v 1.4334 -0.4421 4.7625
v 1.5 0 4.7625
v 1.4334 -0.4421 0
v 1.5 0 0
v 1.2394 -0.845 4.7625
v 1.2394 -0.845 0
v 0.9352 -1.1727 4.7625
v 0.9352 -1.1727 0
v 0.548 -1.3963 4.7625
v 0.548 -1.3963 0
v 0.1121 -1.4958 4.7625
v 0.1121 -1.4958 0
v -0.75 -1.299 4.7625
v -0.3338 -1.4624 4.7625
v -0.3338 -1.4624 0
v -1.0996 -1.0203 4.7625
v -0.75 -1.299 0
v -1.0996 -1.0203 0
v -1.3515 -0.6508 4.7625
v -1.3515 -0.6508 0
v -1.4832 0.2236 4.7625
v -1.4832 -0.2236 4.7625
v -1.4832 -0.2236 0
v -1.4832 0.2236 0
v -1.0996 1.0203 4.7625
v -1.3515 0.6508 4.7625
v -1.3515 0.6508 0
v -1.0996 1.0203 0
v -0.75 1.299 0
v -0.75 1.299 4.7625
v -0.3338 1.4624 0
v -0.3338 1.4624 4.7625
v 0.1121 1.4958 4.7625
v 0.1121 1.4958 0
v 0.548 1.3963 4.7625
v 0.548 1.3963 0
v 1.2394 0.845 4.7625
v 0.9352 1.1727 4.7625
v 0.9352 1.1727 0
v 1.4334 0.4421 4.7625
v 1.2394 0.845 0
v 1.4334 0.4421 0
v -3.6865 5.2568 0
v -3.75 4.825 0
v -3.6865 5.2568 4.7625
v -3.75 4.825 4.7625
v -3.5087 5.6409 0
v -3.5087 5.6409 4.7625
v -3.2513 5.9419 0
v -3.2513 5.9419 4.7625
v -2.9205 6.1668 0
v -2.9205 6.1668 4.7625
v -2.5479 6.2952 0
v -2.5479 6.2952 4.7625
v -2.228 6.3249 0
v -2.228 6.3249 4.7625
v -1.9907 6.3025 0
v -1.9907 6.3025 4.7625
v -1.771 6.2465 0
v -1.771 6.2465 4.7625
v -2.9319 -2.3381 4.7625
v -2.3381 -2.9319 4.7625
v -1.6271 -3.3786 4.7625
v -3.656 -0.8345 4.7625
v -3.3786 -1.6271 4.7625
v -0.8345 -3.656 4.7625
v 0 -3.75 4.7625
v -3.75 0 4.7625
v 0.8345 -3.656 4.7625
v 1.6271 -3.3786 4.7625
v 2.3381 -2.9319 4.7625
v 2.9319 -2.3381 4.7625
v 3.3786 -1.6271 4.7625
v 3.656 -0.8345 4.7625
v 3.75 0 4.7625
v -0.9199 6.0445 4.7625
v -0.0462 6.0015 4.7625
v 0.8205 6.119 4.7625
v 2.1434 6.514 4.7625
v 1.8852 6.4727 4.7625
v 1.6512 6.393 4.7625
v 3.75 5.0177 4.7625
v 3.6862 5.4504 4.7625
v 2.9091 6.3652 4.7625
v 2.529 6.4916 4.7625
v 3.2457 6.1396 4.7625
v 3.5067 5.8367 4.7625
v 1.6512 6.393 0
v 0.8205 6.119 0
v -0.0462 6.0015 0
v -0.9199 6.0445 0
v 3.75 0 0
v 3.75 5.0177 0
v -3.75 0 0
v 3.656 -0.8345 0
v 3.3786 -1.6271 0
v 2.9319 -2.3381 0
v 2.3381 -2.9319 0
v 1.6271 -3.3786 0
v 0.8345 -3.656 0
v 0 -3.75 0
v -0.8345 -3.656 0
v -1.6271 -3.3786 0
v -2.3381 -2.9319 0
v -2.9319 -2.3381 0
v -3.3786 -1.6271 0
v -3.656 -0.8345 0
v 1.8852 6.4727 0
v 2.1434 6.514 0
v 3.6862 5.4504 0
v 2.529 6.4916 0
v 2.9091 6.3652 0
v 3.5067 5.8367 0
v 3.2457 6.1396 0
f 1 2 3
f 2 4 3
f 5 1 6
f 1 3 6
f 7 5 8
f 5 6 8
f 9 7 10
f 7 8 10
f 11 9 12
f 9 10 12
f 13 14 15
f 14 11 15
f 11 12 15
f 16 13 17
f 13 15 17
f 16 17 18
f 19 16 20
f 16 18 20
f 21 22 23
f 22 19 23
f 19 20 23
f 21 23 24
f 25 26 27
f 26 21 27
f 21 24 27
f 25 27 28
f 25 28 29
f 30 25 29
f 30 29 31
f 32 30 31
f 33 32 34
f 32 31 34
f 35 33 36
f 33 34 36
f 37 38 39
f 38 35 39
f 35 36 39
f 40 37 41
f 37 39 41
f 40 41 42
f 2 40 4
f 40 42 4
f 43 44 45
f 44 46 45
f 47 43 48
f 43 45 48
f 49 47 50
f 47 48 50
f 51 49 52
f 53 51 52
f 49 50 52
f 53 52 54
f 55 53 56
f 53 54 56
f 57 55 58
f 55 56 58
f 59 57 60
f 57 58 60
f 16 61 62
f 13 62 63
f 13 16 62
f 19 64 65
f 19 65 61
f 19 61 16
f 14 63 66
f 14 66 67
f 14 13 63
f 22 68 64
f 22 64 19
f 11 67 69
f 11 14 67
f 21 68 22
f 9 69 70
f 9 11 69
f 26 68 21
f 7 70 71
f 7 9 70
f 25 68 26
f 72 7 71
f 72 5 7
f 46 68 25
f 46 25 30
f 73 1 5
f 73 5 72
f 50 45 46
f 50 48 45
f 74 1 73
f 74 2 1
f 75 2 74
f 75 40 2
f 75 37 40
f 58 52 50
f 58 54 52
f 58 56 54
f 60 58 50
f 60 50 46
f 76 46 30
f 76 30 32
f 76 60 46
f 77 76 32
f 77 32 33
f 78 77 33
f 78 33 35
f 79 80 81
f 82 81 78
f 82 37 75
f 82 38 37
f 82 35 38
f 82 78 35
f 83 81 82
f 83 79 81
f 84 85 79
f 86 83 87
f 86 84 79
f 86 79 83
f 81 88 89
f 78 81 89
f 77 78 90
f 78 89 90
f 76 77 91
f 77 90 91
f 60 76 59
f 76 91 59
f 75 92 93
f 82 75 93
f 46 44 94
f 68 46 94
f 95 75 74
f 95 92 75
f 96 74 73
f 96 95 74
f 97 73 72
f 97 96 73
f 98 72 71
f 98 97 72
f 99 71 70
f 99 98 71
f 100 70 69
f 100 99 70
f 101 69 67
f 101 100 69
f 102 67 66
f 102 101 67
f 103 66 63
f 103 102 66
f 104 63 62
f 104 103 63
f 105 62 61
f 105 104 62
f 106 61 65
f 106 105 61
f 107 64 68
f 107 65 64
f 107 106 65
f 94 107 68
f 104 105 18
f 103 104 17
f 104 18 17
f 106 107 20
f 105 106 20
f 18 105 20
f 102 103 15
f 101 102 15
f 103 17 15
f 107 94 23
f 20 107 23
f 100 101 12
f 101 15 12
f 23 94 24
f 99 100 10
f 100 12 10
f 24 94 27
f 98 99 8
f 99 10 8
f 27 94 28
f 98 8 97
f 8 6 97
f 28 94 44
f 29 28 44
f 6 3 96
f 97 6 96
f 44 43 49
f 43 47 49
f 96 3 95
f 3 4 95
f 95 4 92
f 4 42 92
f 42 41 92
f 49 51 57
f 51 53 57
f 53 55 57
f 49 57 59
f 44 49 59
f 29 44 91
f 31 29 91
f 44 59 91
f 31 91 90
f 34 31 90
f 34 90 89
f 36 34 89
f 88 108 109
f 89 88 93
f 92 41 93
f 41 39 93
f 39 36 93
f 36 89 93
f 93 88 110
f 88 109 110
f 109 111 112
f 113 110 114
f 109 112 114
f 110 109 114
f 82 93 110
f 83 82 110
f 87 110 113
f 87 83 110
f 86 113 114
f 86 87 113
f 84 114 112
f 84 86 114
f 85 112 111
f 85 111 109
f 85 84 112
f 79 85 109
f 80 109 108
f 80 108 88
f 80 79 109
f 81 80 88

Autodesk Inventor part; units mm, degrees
ref_plane "YZ Plane" through (0, 0, 0) normal (1, 0, 0) x (0, 1, 0)
ref_plane "XZ Plane" through (0, 0, 0) normal (0, 1, 0) x (-1, 0, 0)
ref_plane "XY Plane" through (0, 0, 0) normal (0, 0, 1) x (1, 0, 0)
sketch "Sketch1" plane through (0, 0, 0) normal (0, 0, 1) x (1, 0, 0)
  circle A0 centre (0, 0) radius 1.5
  circle A1 centre (0, 0) radius 3.75
  circle A2 centre (0, 0) radius 6 construction
  line L0 (0, 0) -> (0, 6) construction
  circle A3 centre (-0.25, 10.7596) radius 4.7625
  line L1 (0, 0) -> (0, 6) construction
  line L2 (3.75, 0) -> (3.75, 6)
  line L3 (-3.75, 6) -> (-3.75, 0)
  arc A4 (-3.75, 0) -> (3.75, 0) centre (0, 0) ccw
  arc A5 (3.75, 6) -> (-2.25, 3) centre (0, 6) ccw
  arc A6 (-3.6447, 0.8824) -> (-3.6447, 5.1176) centre (-12.392, 3) ccw
  point P0 (0, 3)
  point P1 (-3.6798, 6.7221)
  point P2 (3.75, 0)
  point P3 (3.3637, 7.6576)
  point P4 (-3.75, 0)
  point P5 (-3.5189, 7.2961)
  dimension "d2" = 12
  dimension "d0" = 3
  dimension "d1" = 7.5
  dimension "d3" = 9.525
  dimension "d4" = 3.75
  dimension "d9" = 0.25
  dimension "d10" = 9
extrude "Extrusion1" add sketch "Sketch1" along normal blind 4.7625 contours A1 | A1 A5 A3 L2 | A1 A6 A5 | L3 A5 A6 A1
fillet "Fillet1" radius 1.5 2 edges at (3.3637, 7.6576, 2.3813) (-3.5189, 7.2961, 2.3813)
sketch "Sketch2" plane through (0, 0, 0) normal (0, 0, -1) x (-1, 0, 0)
  line L0 (-3.75, 0) -> (-3.75, 5.0177) projected
  arc A0 (-3.75, 0) -> (3.75, 0) centre (0, 0) ccw projected
  circle A1 centre (0, 0) radius 1.5 projected
  circle A2 centre (0, 0) radius 6.9991 construction
  arc A3 (3.75, 4.825) -> (1.771, 6.2465) centre (2.25, 4.825) ccw projected
  arc A4 (-1.6512, 6.393) -> (1.771, 6.2465) centre (0.25, 10.7596) ccw projected
  arc A5 (-1.6512, 6.393) -> (-3.75, 5.0177) centre (-2.25, 5.0177) ccw projected
  line L1 (3.75, 4.825) -> (3.75, 0) projected
  arc A6 (-1.6512, 6.393) -> (-3.75, 5.0177) centre (-2.25, 5.0177) ccw projected
equation "\"d4\" = 0.5 * d1"
properties part number "Cam - Lever" material "Nylon 6/6"
